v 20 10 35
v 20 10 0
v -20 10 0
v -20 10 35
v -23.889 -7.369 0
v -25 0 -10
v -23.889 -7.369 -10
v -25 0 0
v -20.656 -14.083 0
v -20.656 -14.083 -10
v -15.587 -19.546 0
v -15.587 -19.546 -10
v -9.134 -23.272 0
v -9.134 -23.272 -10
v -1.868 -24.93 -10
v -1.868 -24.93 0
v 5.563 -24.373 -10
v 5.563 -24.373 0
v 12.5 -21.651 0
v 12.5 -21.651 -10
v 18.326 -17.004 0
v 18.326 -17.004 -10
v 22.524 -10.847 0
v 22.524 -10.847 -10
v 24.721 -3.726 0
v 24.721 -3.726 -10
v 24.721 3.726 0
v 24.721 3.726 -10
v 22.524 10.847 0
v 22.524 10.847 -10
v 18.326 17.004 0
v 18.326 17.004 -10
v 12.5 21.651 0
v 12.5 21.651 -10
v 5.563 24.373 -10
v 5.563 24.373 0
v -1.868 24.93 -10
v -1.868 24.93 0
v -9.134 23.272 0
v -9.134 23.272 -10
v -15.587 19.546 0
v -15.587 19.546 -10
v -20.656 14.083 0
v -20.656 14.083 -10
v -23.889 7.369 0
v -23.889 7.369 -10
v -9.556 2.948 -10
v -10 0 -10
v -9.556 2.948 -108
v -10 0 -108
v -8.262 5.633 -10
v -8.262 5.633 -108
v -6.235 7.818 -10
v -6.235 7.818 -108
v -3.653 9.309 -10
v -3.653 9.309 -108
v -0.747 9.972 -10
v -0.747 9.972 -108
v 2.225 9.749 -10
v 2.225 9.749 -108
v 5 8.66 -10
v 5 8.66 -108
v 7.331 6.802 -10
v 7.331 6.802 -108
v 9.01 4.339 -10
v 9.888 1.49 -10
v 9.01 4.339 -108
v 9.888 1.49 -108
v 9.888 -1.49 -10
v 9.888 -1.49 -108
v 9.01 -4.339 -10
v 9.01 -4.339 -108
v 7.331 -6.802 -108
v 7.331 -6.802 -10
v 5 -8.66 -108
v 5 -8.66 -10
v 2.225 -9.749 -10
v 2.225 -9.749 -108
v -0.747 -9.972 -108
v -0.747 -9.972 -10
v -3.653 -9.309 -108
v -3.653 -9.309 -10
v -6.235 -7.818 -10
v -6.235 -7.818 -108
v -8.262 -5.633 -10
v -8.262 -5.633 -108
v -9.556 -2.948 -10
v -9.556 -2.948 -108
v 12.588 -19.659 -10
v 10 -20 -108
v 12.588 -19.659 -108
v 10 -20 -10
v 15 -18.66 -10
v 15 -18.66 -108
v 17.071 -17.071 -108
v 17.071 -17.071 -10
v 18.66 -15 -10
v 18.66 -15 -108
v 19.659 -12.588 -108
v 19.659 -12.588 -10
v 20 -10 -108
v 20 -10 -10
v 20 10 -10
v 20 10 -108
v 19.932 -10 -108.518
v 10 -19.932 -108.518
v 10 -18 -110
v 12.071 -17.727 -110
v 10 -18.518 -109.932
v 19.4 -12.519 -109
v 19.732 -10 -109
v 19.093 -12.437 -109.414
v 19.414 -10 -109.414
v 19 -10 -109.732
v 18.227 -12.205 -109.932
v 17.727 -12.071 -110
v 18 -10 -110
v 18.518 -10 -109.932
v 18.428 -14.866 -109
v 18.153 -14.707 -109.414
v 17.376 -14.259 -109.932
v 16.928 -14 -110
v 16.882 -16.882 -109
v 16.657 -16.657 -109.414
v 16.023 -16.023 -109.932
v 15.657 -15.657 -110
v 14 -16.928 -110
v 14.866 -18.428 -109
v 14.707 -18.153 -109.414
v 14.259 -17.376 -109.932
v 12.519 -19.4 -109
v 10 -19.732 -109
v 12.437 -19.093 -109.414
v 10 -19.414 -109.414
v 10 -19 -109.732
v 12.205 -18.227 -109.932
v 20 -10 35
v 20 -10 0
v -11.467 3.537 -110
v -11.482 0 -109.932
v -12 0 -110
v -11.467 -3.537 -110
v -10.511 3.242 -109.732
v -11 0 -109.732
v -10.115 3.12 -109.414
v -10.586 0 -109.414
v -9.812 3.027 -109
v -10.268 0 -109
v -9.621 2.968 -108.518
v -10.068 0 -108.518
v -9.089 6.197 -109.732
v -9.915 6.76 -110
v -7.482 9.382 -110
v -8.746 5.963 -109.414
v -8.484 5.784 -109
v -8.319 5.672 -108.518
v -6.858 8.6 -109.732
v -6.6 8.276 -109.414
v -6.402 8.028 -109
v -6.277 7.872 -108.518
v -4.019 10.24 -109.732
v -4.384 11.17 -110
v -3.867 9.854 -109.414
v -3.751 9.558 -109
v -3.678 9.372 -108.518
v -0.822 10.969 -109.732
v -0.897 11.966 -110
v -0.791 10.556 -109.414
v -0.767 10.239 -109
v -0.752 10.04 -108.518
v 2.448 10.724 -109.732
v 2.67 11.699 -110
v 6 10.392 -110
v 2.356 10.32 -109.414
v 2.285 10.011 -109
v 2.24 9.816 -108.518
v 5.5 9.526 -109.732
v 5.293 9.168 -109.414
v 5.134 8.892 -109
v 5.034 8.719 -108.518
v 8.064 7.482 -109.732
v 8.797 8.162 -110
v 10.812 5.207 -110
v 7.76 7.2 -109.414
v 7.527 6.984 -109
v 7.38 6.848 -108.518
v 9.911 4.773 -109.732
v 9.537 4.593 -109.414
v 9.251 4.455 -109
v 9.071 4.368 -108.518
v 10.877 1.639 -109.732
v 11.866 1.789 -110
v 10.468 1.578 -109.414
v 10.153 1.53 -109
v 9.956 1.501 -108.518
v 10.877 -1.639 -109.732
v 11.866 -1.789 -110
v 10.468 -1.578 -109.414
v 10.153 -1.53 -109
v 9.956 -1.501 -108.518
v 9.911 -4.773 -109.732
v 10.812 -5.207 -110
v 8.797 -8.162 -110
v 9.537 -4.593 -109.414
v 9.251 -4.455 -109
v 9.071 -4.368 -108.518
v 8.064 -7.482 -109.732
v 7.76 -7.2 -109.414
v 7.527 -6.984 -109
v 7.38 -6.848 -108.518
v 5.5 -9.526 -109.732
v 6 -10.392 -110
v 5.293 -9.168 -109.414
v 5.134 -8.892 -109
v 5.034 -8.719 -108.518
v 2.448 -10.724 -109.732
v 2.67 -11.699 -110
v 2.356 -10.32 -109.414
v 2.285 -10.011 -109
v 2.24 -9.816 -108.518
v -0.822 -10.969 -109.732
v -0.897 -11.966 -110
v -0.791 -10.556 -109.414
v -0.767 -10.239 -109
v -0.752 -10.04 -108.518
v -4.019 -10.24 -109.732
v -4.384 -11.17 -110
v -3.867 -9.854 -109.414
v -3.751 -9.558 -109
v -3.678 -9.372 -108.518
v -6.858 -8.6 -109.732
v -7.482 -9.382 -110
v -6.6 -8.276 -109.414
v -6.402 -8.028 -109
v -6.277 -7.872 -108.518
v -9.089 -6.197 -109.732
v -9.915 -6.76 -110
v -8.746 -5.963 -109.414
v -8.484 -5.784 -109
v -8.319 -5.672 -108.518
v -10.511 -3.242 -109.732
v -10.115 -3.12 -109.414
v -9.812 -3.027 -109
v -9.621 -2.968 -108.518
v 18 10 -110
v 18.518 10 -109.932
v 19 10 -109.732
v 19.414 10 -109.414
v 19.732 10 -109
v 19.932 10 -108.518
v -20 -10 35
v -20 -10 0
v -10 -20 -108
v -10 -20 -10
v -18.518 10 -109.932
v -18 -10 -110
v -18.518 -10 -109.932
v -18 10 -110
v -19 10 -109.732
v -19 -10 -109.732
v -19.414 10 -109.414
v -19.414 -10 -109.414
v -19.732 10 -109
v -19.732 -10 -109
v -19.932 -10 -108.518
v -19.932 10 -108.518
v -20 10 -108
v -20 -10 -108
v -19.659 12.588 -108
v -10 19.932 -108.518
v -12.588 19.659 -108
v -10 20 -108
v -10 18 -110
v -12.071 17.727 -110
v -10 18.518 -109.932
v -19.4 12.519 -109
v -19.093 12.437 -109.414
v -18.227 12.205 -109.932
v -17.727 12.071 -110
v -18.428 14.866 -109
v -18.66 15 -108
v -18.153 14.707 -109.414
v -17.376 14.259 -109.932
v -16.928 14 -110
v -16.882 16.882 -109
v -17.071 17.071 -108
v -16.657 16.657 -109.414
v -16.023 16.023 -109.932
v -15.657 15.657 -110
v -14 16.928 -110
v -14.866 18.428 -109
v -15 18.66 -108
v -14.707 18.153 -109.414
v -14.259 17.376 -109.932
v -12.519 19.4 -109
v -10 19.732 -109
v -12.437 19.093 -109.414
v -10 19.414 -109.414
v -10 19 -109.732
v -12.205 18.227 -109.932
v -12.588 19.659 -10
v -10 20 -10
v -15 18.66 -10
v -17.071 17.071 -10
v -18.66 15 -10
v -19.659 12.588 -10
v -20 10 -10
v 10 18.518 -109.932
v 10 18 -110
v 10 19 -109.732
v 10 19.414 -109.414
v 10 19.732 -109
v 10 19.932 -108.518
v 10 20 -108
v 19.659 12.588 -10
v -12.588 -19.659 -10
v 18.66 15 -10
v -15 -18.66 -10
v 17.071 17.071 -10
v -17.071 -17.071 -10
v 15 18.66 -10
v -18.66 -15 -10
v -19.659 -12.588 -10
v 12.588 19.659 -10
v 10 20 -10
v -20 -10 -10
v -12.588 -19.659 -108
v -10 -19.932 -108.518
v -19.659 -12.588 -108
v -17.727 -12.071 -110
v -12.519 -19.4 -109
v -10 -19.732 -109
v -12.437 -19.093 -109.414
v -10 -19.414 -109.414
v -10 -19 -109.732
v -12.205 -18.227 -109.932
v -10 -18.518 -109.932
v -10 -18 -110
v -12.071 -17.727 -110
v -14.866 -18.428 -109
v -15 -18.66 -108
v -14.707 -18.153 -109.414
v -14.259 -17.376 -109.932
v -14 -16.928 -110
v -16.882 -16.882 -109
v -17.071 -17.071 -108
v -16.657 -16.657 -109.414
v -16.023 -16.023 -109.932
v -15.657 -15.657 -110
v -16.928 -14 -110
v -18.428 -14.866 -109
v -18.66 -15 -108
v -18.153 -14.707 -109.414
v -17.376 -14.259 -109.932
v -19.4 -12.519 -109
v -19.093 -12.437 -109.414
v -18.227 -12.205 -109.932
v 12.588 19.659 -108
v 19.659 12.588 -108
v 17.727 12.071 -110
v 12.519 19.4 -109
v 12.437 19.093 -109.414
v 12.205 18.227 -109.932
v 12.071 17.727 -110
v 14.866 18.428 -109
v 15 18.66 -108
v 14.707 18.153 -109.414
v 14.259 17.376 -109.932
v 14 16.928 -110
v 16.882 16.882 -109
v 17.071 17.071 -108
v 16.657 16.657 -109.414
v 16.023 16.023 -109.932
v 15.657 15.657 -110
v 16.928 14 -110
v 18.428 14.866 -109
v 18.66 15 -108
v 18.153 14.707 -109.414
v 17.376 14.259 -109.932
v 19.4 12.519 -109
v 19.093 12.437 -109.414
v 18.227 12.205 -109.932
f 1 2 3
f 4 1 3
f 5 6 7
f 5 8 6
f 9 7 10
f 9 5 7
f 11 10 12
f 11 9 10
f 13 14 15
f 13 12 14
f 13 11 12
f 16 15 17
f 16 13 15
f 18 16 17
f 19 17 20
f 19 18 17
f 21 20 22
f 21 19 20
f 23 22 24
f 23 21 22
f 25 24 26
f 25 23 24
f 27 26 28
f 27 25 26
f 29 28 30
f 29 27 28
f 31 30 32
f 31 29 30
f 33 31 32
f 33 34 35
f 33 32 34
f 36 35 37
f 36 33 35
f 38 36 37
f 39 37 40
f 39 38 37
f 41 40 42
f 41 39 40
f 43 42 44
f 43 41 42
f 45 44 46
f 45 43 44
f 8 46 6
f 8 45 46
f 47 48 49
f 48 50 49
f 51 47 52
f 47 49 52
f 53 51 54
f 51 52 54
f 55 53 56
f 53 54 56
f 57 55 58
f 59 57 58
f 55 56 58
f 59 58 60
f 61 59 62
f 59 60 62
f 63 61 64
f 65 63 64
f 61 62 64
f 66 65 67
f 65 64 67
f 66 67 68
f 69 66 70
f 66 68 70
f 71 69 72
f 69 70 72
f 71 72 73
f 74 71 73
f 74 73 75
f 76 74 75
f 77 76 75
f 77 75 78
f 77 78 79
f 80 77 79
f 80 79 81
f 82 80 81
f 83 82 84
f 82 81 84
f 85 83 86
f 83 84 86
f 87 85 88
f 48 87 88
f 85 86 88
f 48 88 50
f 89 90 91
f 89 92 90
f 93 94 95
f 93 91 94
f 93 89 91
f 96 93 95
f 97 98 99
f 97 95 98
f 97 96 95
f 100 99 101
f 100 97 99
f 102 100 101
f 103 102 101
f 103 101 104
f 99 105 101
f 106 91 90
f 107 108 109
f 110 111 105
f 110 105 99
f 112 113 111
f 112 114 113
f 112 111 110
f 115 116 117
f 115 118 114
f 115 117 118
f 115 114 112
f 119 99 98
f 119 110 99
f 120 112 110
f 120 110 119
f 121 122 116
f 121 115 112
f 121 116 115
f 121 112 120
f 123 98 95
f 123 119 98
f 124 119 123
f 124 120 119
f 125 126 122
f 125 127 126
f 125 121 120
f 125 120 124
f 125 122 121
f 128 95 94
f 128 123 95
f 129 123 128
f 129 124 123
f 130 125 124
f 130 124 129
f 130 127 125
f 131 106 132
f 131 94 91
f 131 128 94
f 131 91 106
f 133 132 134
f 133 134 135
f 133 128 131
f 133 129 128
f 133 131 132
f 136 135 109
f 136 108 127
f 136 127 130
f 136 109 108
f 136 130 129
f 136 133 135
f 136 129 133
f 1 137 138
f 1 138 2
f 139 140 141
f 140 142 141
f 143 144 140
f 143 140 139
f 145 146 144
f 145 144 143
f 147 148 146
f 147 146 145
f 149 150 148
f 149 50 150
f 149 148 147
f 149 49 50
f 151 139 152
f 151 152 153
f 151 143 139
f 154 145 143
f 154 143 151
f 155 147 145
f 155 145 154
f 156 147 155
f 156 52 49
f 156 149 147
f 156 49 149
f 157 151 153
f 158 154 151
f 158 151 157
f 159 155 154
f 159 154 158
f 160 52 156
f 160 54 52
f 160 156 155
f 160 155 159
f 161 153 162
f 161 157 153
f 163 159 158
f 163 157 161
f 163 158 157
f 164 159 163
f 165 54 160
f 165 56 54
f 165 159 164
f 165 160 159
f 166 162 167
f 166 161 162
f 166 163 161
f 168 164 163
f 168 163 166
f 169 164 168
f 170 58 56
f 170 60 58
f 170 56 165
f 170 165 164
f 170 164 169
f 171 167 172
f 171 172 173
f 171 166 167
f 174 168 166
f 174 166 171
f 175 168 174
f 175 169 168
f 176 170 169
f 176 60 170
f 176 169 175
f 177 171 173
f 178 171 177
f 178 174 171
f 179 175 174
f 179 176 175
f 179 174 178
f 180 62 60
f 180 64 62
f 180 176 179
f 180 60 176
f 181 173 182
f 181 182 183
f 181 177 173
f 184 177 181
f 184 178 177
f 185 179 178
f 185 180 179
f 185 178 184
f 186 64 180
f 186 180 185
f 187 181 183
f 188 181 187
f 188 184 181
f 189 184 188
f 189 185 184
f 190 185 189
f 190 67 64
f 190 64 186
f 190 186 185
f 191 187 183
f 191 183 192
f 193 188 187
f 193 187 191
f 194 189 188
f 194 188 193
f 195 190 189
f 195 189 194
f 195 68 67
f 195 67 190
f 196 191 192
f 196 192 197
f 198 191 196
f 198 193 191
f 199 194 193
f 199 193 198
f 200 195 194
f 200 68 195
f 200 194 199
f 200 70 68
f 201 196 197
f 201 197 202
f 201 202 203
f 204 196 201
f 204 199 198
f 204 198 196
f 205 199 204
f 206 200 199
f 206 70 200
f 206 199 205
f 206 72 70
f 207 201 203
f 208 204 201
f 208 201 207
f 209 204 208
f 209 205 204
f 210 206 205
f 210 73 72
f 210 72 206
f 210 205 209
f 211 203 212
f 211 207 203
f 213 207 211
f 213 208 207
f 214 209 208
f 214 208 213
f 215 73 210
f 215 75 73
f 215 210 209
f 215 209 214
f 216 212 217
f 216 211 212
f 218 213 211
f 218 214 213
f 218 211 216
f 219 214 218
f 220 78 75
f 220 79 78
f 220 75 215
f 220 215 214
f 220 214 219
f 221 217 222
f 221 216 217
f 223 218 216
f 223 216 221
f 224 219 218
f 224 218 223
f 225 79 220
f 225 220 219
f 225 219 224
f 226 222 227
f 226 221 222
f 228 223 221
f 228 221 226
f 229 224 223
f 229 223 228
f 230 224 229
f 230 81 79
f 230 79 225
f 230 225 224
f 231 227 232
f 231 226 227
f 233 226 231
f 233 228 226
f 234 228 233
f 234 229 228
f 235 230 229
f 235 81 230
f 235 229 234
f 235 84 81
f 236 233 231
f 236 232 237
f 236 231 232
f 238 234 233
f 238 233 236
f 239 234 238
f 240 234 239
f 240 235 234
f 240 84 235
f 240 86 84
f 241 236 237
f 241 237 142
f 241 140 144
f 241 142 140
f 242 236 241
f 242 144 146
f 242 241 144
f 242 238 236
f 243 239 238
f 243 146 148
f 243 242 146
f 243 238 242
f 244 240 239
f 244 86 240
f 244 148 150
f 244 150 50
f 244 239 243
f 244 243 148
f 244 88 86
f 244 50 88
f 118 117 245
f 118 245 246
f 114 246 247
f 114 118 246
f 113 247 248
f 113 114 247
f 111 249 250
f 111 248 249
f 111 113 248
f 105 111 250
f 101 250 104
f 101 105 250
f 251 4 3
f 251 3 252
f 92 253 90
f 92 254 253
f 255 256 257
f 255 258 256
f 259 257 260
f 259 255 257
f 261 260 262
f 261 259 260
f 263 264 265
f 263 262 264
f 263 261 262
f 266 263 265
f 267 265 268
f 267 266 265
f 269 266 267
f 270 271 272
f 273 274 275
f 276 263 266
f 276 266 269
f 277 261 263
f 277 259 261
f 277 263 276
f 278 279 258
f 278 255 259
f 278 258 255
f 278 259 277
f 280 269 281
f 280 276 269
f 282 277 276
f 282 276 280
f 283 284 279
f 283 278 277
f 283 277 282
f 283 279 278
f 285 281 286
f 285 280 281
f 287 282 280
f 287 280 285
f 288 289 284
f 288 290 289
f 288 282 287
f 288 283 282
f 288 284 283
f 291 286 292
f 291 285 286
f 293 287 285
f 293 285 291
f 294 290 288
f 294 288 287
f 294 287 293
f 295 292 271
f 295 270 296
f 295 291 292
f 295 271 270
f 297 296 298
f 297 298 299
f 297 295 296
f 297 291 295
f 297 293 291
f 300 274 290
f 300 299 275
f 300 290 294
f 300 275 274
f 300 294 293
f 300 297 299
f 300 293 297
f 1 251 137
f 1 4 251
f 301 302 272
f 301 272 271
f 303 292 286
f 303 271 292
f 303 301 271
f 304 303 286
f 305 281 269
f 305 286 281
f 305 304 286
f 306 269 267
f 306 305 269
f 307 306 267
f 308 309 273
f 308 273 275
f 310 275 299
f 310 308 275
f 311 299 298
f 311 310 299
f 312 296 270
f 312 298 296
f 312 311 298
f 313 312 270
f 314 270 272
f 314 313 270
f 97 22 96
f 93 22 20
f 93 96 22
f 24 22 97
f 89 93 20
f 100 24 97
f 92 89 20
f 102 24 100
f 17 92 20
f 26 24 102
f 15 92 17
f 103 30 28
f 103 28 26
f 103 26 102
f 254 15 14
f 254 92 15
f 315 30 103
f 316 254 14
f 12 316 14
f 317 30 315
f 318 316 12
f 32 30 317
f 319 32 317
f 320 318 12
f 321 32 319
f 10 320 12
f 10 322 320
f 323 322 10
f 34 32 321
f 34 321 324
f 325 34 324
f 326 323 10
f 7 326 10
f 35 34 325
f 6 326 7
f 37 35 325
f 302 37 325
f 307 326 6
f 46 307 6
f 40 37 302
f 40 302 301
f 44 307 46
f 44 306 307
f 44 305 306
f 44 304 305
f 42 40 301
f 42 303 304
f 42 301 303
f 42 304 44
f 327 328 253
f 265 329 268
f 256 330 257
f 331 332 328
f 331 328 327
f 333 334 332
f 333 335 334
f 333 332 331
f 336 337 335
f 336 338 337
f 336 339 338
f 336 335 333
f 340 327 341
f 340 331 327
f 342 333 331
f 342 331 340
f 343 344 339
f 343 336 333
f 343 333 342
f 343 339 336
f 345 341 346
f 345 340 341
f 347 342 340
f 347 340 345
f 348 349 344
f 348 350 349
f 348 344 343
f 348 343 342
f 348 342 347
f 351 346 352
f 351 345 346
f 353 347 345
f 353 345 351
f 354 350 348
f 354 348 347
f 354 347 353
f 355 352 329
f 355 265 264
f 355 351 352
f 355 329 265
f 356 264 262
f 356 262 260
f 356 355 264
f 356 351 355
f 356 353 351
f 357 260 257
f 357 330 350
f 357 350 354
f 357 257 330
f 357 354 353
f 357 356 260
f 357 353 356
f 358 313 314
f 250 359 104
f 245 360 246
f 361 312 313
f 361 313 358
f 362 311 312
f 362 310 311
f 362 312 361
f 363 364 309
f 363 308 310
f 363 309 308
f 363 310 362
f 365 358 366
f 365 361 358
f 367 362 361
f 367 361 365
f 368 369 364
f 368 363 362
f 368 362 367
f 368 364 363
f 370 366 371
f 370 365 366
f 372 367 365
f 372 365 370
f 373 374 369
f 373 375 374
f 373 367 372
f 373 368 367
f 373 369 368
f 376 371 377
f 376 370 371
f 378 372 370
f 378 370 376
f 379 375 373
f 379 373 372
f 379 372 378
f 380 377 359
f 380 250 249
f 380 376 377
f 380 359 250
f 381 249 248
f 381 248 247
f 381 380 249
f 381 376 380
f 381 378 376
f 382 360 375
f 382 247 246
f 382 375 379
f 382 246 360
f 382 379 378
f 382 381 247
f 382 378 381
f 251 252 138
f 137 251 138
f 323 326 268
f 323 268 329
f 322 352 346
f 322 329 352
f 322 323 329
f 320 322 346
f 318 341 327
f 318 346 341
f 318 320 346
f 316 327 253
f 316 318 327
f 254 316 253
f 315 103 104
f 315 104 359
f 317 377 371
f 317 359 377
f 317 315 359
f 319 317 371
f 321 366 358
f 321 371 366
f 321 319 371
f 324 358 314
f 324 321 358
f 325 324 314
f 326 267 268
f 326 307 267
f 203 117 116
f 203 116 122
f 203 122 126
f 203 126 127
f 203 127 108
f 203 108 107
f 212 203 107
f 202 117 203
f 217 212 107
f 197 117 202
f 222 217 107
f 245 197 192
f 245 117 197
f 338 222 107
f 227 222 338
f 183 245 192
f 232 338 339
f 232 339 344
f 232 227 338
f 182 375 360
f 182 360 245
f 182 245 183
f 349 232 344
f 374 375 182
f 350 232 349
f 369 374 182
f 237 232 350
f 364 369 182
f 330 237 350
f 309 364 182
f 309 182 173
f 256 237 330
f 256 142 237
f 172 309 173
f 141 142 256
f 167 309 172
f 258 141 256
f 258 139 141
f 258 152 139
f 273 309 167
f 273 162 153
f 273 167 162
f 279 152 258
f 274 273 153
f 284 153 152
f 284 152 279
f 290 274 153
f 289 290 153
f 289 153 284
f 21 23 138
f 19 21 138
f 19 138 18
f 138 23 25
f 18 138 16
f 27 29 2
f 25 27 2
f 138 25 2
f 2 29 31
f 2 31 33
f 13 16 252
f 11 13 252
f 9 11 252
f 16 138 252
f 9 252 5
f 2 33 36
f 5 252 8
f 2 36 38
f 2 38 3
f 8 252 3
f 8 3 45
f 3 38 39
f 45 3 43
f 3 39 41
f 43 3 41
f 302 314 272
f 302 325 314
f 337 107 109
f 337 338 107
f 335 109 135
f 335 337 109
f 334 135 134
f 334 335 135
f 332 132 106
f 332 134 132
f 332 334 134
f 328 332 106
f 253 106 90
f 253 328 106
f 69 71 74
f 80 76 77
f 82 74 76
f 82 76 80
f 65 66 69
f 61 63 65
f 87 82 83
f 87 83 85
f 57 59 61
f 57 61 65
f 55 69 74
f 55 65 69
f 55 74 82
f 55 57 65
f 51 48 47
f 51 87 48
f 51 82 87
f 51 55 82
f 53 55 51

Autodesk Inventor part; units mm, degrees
ref_plane "YZ Plane" through (0, 0, 0) normal (1, 0, 0) x (0, 1, 0)
ref_plane "XZ Plane" through (0, 0, 0) normal (0, 1, 0) x (-1, 0, 0)
ref_plane "XY Plane" through (0, 0, 0) normal (0, 0, 1) x (1, 0, 0)
sketch "Skizze2" plane through (0, 0, 0) normal (0, 0, 1) x (1, 0, 0)
  line L0 (-20, -10) -> (20, -10)
  line L1 (20, -10) -> (20, 10)
  line L2 (20, 10) -> (-20, 10)
  line L3 (-20, 10) -> (-20, -10)
  line L4 (-20, -10) -> (20, 10) construction
  line L5 (20, -10) -> (-20, 10) construction
  point P0 (0, 0)
  dimension "d0" = 40
  dimension "d1" = 20
extrude "Extrusion1" add sketch "Skizze2" along normal blind 35
sketch "Skizze3" plane through (0, 0, 0) normal (0, 0, -1) x (-1, 0, 0)
  circle A0 centre (0, 0) radius 25
  dimension "d4" = 50
extrude "Extrusion2" add sketch "Skizze3" along normal blind 10
sketch "Skizze4" plane through (0, 0, -10) normal (0, 0, -1) x (-1, 0, 0)
  line L0 (10, -20) -> (-10, -20)
  line L1 (-20, -10) -> (-20, 10)
  line L2 (-10, 20) -> (10, 20)
  line L3 (20, 10) -> (20, -10)
  line L4 (20, -20) -> (-20, 20) construction
  line L5 (-20, -20) -> (20, 20) construction
  arc A0 (-20, -10) -> (-10, -20) centre (-10, -10) ccw
  arc A1 (-10, 20) -> (-20, 10) centre (-10, 10) ccw
  arc A2 (20, 10) -> (10, 20) centre (10, 10) ccw
  arc A3 (10, -20) -> (20, -10) centre (10, -10) ccw
  point P0 (0, 0)
  dimension "d7" = 40
  dimension "d8" = 40
  dimension "d9" = 10
extrude "Extrusion3" add sketch "Skizze4" along normal blind 100
sketch "Skizze5" plane through (0, 0, -110) normal (0, 0, -1) x (-1, 0, 0)
  circle A0 centre (0, 0) radius 10
  dimension "d12" = 20
extrude "Extrusion4" cut sketch "Skizze5" against normal up to surface (100 mm away)
fillet "Rundung1" radius 2 9 edges at (17.0711, -17.0711, -110) (0, -20, -110) (-17.0711, -17.0711, -110) (-20, 0, -110) (-17.0711, 17.0711, -110) (0, 20, -110) (17.0711, 17.0711, -110) (20, 0, -110) (10, 0, -110)
properties part number "Hubvorrichtung"
